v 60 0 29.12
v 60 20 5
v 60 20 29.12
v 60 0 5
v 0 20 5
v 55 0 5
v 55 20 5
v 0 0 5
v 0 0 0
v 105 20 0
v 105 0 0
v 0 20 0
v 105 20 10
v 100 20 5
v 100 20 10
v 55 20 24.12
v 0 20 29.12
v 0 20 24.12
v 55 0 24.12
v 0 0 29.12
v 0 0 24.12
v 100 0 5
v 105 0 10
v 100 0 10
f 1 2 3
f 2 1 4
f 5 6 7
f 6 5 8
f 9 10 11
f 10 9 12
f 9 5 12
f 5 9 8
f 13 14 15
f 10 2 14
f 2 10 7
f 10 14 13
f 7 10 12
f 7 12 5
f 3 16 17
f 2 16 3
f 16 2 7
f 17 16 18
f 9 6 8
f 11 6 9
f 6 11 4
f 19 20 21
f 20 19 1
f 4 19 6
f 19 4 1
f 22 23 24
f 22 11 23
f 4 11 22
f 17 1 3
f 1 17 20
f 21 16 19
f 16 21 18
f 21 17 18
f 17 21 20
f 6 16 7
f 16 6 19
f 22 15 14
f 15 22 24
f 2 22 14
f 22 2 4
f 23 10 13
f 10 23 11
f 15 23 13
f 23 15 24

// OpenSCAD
/*
Parametric Headphone Desk Holder

Copyright 2024 nomike[AT]nomike[DOT]com

Redistribution and use in source and binary forms, with or without
modification, are permitted provided that the following conditions are met:

1. Redistributions of source code must retain the above copyright notice, this
list of conditions and the following disclaimer.

2. Redistributions in binary form must reproduce the above copyright notice,
this list of conditions and the following disclaimer in the documentation
and/or other materials provided with the distribution.

THIS SOFTWARE IS PROVIDED BY THE COPYRIGHT HOLDERS AND CONTRIBUTORS “AS IS” AND
ANY EXPRESS OR IMPLIED WARRANTIES, INCLUDING, BUT NOT LIMITED TO, THE IMPLIED
WARRANTIES OF MERCHANTABILITY AND FITNESS FOR A PARTICULAR PURPOSE ARE
DISCLAIMED. IN NO EVENT SHALL THE COPYRIGHT HOLDER OR CONTRIBUTORS BE LIABLE FOR
ANY DIRECT, INDIRECT, INCIDENTAL, SPECIAL, EXEMPLARY, OR CONSEQUENTIAL DAMAGES
(INCLUDING, BUT NOT LIMITED TO, PROCUREMENT OF SUBSTITUTE GOODS OR SERVICES;
LOSS OF USE, DATA, OR PROFITS; OR BUSINESS INTERRUPTION) HOWEVER CAUSED AND ON
ANY THEORY OF LIABILITY, WHETHER IN CONTRACT, STRICT LIABILITY, OR TORT
(INCLUDING NEGLIGENCE OR OTHERWISE) ARISING IN ANY WAY OUT OF THE USE OF THIS
SOFTWARE, EVEN IF ADVISED OF THE POSSIBILITY OF SUCH DAMAGE.
*/

width = 20;
wall_strength = 5;
length_under_desk = 55;
desk_thickness = 19.12;
headphone_width = 40;
slip_off_protection_height = 5;

union() {
    color("red") cube([length_under_desk + wall_strength, width, wall_strength]);
    translate([0, 0, desk_thickness + wall_strength]) color("blue") cube([length_under_desk + wall_strength, width, wall_strength]);
    translate([length_under_desk, 0, wall_strength]) color("green") cube([wall_strength, width, desk_thickness]);
    translate([length_under_desk + wall_strength, 0, 0]) color("yellow") cube([headphone_width, width, wall_strength]);
    translate([length_under_desk + wall_strength + headphone_width, 0, 0]) color("orange") cube([wall_strength, width, wall_strength + slip_off_protection_height]);
}
